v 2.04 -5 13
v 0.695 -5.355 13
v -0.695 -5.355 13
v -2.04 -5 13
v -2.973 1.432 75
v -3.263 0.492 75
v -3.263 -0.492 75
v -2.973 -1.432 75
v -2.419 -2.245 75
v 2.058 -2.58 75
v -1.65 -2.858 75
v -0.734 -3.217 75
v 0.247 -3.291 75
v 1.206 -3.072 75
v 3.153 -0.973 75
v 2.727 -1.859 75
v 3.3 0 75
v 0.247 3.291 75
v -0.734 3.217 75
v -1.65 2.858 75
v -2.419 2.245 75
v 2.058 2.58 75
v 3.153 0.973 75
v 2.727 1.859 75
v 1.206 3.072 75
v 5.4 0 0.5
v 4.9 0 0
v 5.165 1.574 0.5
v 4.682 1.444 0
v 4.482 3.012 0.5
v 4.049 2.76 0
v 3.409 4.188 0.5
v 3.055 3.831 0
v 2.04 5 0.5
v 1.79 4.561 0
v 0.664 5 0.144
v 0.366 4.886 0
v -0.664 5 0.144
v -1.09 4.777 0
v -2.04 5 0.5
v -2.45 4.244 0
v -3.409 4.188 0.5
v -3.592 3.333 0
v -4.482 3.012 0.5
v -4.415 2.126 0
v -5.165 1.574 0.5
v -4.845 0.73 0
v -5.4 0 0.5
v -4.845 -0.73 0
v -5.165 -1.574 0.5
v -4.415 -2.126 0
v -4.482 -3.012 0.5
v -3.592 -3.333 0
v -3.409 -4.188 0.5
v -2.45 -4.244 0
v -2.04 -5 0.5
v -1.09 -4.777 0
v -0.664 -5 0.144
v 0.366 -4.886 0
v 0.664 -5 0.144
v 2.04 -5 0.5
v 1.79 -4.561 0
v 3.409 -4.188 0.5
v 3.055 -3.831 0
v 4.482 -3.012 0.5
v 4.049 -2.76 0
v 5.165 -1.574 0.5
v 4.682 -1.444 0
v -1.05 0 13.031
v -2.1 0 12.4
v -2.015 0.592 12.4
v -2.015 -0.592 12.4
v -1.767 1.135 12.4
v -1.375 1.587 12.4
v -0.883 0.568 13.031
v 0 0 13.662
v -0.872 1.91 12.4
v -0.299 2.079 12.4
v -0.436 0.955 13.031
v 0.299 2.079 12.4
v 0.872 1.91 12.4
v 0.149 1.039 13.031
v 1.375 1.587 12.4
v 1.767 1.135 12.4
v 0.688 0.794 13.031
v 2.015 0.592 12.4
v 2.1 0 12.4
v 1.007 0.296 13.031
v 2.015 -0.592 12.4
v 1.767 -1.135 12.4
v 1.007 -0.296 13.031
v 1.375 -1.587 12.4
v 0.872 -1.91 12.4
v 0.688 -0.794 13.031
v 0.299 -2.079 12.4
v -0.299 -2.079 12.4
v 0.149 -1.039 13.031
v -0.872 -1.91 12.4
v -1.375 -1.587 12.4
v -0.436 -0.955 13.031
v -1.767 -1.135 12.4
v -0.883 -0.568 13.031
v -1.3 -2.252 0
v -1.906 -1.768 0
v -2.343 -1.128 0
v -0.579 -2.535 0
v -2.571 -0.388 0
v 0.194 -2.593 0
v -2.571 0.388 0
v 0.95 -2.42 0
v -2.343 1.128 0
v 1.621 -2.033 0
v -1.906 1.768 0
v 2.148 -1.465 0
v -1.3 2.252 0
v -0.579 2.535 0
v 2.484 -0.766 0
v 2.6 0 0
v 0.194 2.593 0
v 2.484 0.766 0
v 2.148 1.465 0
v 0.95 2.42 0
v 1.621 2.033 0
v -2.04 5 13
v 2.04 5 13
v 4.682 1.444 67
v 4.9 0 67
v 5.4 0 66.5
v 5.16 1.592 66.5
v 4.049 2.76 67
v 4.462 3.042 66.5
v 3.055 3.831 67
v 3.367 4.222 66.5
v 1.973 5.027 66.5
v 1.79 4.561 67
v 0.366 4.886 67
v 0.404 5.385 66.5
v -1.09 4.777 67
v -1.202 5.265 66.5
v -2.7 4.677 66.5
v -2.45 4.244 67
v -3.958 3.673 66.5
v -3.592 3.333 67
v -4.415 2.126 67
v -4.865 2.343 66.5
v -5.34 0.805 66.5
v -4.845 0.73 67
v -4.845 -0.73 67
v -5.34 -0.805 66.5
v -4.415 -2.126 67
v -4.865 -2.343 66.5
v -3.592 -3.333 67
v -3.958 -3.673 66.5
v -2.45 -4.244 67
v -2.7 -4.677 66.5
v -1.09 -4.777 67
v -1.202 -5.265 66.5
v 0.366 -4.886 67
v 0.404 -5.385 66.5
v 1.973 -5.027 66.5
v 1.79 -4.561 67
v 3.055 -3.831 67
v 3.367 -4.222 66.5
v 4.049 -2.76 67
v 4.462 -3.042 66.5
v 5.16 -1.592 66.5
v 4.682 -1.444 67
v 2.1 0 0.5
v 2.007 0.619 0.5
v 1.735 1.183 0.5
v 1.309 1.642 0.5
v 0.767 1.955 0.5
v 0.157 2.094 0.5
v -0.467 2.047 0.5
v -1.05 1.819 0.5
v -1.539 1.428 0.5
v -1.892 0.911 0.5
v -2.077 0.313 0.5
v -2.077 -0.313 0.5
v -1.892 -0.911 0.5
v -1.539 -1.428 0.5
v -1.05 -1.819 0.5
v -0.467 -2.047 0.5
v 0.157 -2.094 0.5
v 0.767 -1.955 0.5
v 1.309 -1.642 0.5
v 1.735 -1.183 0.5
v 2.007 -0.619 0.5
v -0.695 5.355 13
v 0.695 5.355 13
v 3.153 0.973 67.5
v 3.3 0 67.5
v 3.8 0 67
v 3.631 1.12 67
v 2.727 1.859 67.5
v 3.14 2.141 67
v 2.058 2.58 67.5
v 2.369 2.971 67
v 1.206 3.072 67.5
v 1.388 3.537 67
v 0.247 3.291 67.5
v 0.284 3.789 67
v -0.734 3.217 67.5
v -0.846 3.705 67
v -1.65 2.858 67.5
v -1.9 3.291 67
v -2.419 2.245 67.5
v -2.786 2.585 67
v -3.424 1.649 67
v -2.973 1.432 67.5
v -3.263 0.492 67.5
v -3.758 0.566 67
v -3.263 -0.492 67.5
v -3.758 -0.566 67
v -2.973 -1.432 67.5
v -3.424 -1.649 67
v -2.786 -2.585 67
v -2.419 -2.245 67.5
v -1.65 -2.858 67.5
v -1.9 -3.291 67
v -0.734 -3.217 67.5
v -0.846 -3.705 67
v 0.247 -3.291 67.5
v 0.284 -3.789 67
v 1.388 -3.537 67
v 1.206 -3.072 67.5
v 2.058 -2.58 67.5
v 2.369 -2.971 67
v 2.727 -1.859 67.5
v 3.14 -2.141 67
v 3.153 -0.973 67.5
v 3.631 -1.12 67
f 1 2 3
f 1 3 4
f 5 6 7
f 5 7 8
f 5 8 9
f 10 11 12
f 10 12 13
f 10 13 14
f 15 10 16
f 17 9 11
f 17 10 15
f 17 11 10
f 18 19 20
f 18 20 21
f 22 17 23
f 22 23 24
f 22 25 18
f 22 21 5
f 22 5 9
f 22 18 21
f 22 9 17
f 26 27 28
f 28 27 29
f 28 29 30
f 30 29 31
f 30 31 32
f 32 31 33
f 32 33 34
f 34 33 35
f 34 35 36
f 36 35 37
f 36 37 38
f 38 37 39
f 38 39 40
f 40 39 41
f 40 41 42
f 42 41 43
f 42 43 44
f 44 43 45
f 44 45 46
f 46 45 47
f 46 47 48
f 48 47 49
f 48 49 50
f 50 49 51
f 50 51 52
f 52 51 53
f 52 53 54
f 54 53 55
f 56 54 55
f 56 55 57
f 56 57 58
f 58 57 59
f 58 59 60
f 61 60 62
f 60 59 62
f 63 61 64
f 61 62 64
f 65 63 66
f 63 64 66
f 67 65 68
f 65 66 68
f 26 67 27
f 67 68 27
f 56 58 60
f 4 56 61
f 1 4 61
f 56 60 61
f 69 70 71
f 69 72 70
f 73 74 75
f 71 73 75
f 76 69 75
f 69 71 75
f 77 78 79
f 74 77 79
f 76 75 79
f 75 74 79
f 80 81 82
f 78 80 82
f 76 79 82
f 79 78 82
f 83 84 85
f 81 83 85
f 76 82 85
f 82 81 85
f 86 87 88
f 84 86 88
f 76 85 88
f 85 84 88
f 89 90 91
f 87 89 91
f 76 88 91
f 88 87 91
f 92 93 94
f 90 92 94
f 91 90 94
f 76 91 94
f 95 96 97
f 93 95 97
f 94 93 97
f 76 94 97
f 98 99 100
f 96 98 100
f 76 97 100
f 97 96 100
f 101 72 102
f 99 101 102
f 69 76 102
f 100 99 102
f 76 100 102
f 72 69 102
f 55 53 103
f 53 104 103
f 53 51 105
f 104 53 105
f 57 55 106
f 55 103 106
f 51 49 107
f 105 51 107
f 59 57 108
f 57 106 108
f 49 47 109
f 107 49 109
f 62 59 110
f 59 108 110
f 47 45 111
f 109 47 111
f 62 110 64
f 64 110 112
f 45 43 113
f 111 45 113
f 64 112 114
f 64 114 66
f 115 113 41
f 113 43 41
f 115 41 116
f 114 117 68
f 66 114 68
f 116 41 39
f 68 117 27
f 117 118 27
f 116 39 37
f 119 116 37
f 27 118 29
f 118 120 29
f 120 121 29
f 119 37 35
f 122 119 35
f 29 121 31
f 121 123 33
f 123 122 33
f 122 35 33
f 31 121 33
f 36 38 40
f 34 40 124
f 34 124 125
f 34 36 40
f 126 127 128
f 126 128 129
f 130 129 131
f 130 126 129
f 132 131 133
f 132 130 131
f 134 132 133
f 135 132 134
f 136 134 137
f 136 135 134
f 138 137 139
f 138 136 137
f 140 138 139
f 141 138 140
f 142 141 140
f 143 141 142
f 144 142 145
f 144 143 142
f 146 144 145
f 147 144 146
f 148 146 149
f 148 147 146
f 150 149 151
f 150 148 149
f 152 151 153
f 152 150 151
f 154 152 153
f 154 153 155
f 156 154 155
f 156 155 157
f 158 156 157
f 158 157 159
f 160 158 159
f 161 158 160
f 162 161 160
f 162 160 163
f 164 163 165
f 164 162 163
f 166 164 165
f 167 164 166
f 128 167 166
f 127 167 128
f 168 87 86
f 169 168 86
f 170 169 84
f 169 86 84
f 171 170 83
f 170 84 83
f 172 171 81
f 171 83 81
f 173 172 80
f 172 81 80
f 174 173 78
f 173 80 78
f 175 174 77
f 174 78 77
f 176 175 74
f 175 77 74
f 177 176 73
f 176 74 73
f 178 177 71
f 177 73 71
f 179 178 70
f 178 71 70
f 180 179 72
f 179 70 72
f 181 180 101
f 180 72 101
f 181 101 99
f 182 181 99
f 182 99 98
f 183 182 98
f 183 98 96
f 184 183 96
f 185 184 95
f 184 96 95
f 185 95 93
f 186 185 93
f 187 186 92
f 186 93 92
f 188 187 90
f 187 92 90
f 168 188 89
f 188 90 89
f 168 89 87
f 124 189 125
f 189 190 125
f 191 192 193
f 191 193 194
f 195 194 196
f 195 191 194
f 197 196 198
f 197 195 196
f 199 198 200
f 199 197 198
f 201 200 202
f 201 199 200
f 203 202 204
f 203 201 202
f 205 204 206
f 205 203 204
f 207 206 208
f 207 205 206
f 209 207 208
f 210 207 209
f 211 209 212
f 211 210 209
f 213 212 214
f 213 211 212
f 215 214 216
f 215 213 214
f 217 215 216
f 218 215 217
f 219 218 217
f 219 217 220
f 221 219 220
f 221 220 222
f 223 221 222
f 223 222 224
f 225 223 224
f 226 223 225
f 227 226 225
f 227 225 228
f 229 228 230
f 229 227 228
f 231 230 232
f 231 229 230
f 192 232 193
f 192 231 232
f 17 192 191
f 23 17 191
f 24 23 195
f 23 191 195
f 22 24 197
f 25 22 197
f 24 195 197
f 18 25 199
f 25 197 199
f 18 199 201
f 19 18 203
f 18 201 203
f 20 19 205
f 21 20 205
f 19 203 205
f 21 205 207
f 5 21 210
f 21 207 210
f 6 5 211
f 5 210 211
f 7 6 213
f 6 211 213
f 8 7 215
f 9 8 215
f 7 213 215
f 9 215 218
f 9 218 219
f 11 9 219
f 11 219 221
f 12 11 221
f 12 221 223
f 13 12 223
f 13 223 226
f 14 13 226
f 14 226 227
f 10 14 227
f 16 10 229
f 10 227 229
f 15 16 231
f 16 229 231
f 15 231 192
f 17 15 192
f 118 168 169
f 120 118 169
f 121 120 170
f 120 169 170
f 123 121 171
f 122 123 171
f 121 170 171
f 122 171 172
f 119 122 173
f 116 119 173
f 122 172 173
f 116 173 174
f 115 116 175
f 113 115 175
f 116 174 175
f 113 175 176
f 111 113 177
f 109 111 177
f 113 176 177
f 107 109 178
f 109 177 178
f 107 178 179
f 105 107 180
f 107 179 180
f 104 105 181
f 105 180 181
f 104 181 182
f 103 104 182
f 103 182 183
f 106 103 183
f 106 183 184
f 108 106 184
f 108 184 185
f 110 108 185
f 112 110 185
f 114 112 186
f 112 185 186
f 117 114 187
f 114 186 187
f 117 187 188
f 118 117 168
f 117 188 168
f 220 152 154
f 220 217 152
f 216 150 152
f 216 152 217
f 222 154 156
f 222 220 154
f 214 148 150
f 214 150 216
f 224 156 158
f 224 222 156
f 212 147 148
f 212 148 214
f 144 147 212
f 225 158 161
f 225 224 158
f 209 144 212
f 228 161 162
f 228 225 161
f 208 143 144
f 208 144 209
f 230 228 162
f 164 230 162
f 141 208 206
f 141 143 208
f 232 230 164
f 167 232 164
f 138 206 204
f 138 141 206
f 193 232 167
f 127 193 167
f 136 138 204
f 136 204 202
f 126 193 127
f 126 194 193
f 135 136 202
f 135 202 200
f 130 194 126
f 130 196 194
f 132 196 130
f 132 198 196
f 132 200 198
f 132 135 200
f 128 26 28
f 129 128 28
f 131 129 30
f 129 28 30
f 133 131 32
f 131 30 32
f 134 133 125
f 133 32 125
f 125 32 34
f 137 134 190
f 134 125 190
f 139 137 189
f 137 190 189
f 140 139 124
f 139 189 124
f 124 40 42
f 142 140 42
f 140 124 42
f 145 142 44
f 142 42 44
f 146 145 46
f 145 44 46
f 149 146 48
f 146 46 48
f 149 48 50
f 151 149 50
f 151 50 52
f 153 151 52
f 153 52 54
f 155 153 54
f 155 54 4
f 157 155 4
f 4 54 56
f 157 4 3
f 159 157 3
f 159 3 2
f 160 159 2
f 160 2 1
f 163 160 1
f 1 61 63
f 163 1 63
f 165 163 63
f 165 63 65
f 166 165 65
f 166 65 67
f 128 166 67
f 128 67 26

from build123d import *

# Parameters (mm, degrees)
SKETCH_1_R             = 5.4
EXTRUDE_1_DEPTH        = 67
CHAMFER_1_SIZE         = 0.5
SKETCH_2_R             = 3.3
EXTRUDE_2_DEPTH        = 8
HOLE_WIZARD_M5_1_D     = 4.2
HOLE_WIZARD_M5_1_DEPTH = 12.4
HOLE_WIZARD_M5_1_TIP   = 1.2618073
CHAMFER_3_SIZE         = 0.5
SKETCH_5_W             = 10
SKETCH_5_H             = 3
CUT_EXTRUDE_3_DEPTH    = 13
CHAMFER_4_SIZE         = 0.5


with BuildPart() as part:
    # 草图1 → 拉伸1 (new body)
    with BuildSketch(Plane.XY):
        Circle(SKETCH_1_R)
    extrude(amount=EXTRUDE_1_DEPTH)

    # 倒角1
    chamfer_1_edges = [part.edges().sort_by_distance(p)[0] for p in [
        (-5.4, 0, 0),
        (-5.4, 0, 67),
    ]]
    chamfer(chamfer_1_edges, length=CHAMFER_1_SIZE)

    # 草图2 → 拉伸2 (add)
    with BuildSketch(Plane.XY.offset(67)):
        Circle(SKETCH_2_R)
    extrude(amount=EXTRUDE_2_DEPTH)

    # M5 螺纹孔1
    with Locations(Plane(origin=(0, 0, 0), x_dir=(-1, 0, 0), z_dir=(0, 0, -1))):
        with Locations((0, 0)):
            Hole(HOLE_WIZARD_M5_1_D / 2, depth=HOLE_WIZARD_M5_1_DEPTH)
            with Locations((0, 0, -(HOLE_WIZARD_M5_1_DEPTH + HOLE_WIZARD_M5_1_TIP / 2))):  # 118° drill point
                Cone(0, HOLE_WIZARD_M5_1_D / 2, HOLE_WIZARD_M5_1_TIP, mode=Mode.SUBTRACT)

    # 倒角3
    chamfer_3_edges = [part.edges().sort_by_distance(p)[0] for p in [
        (-2.1, 0, 0),
    ]]
    chamfer(chamfer_3_edges, length=CHAMFER_3_SIZE)

    # 草图5 → 拉伸3 (cut)
    with BuildSketch(Plane.XY):
        with Locations((0, 6.5)):
            Rectangle(SKETCH_5_W, SKETCH_5_H)
    cut_extrude_3 = extrude(amount=CUT_EXTRUDE_3_DEPTH, mode=Mode.SUBTRACT)

    # 镜向1: 拉伸3 across plane
    add(cut_extrude_3.mirror(Plane.ZX), mode=Mode.SUBTRACT)

    # 倒角4
    chamfer_4_edges = [part.edges().sort_by_distance(p)[0] for p in [
        (-3.3, 0, 67),
    ]]
    chamfer(chamfer_4_edges, length=CHAMFER_4_SIZE)


solid = part.part
